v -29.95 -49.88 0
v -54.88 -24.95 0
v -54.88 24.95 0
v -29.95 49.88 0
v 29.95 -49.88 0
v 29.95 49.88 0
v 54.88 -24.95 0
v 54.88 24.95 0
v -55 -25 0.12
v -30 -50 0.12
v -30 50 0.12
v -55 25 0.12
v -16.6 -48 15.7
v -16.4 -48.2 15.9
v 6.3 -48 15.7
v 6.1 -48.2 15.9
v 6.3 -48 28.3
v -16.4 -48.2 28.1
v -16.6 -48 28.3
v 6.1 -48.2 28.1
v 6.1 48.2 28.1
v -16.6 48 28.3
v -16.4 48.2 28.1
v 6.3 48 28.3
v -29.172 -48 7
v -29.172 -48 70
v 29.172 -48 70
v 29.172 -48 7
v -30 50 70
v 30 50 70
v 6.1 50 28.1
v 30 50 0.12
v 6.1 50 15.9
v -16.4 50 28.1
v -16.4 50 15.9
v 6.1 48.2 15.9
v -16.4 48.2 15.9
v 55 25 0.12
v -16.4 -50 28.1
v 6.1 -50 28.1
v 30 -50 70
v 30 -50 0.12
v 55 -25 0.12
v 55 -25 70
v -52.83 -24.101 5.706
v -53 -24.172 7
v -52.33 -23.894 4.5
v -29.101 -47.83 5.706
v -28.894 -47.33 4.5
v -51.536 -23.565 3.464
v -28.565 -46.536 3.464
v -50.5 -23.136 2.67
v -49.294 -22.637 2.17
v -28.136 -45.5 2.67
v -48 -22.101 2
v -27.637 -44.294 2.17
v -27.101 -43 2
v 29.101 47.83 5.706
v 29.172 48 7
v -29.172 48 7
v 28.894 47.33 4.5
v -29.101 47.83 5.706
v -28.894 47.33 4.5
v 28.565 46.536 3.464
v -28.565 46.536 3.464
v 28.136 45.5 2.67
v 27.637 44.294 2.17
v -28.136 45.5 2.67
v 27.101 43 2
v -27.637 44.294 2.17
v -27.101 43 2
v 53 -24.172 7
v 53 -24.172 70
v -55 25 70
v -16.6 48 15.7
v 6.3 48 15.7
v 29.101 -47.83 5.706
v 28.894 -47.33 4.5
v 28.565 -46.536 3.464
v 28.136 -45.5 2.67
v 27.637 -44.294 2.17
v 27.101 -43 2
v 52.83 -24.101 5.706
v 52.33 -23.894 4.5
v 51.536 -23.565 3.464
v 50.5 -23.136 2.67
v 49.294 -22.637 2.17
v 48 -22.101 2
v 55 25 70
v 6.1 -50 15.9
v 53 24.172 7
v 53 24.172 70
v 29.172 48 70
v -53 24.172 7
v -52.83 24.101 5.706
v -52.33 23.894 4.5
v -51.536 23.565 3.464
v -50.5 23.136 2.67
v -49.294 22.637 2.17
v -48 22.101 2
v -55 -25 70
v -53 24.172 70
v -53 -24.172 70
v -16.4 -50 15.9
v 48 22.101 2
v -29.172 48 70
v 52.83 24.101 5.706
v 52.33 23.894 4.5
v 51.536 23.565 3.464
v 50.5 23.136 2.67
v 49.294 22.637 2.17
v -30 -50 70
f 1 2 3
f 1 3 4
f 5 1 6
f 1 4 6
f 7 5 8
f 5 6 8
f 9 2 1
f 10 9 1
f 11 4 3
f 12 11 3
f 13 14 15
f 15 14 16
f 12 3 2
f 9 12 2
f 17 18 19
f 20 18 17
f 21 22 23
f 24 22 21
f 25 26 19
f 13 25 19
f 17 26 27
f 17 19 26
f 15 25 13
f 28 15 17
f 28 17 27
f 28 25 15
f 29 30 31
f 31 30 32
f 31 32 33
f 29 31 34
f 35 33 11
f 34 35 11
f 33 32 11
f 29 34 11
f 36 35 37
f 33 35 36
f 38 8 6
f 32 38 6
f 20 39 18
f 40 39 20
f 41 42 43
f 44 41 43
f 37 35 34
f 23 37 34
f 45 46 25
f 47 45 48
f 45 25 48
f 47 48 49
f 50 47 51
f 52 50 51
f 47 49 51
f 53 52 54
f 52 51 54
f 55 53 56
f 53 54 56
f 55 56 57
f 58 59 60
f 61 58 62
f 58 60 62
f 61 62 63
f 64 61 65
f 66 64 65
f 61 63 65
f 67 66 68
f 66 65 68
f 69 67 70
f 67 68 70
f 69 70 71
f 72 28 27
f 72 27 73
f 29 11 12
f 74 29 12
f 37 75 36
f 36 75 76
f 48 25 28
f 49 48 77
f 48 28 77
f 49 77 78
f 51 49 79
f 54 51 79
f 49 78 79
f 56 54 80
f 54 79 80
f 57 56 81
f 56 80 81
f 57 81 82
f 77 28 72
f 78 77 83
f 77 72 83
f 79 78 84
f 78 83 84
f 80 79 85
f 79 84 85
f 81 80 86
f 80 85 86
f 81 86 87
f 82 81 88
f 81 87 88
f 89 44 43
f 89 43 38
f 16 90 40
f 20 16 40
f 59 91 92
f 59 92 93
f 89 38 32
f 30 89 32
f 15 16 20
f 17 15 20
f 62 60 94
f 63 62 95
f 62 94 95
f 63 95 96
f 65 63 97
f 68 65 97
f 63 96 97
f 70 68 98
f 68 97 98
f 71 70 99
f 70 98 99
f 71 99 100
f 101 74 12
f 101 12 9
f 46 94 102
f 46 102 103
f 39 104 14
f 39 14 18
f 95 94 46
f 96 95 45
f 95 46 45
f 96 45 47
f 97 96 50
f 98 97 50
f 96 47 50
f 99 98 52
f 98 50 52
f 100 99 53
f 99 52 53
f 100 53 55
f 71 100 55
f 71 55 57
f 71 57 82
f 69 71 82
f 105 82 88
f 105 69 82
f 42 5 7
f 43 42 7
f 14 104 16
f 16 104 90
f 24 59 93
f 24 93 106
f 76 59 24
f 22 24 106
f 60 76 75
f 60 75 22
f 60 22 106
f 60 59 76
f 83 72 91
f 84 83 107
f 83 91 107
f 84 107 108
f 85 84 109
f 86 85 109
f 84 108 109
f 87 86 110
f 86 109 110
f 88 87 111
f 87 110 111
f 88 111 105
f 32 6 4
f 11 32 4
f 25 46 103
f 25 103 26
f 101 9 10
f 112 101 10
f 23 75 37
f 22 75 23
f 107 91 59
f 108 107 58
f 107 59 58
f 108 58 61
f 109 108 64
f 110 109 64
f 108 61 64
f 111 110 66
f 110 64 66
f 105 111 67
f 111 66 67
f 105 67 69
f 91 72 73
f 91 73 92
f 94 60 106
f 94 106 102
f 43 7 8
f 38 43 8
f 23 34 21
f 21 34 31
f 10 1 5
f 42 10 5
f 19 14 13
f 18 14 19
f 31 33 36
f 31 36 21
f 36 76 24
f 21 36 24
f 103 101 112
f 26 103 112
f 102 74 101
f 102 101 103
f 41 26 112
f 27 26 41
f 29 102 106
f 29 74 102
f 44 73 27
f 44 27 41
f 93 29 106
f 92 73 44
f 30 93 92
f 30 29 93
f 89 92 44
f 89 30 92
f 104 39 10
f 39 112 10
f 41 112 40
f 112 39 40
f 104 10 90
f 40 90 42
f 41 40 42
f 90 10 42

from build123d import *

# Parameters (mm, degrees)
SALIENTE_EXTRUIR1_DEPTH = 70
VACIADO1_T              = -2
CORTAR_EXTRUIR1_REACH   = 135.884
CROQUIS4_W              = 22.5
CROQUIS4_H              = 12.2
REDONDEO1_R             = 5
CHAFL_N1_SIZE           = 0.12
CHAFL_N2_SIZE           = 0.2


with BuildPart() as part:
    # Croquis1 → Saliente-Extruir1 (new body)
    with BuildSketch(Plane.XY):
        Polygon((30, 50), (-30, 50), (-55, 25), (-55, -25), (-30, -50), (30, -50), (55, -25), (55, 25), align=None)
    extrude(amount=SALIENTE_EXTRUIR1_DEPTH)

    # Vaciado1
    vaciado1_openings = [part.faces().sort_by_distance(p)[0] for p in [
        (0, 0, 70),
    ]]
    offset(amount=VACIADO1_T, openings=vaciado1_openings, kind=Kind.INTERSECTION)

    # Croquis4 → Cortar-Extruir1 (cut, up to next)
    with BuildSketch(Plane.XZ.offset(50), mode=Mode.PRIVATE) as cortar_extruir1_sk1:
        with Locations((-5.15, 22)):
            Rectangle(CROQUIS4_W, CROQUIS4_H)
    cortar_extruir1_tool1 = extrude(cortar_extruir1_sk1.sketch, amount=-CORTAR_EXTRUIR1_REACH, mode=Mode.PRIVATE) & part.part
    cortar_extruir1 = cortar_extruir1_tool1.solids().sort_by_distance((-5.15, -50, 22))[0]
    add(cortar_extruir1, mode=Mode.SUBTRACT)

    # Simetría1: Cortar-Extruir1 across plane
    add(cortar_extruir1.mirror(Plane.ZX), mode=Mode.SUBTRACT)

    # Redondeo1
    redondeo1_edges = [part.edges().sort_by_distance(p)[0] for p in [
        (41.085786438, -36.085786438, 2),
        (53, 0, 2),
        (41.085786438, 36.085786438, 2),
        (0, 48, 2),
        (-41.085786438, 36.085786438, 2),
        (-53, 0, 2),
        (-41.085786438, -36.085786438, 2),
        (0, -48, 2),
    ]]
    fillet(redondeo1_edges, radius=REDONDEO1_R)

    # Chaflán1
    chafl_n1_edges = [part.edges().sort_by_distance(p)[0] for p in [
        (0, 50, 0),
        (42.5, 37.5, 0),
        (55, 0, 0),
        (42.5, -37.5, 0),
        (0, -50, 0),
        (-42.5, -37.5, 0),
        (-55, 0, 0),
        (-42.5, 37.5, 0),
    ]]
    chamfer(chafl_n1_edges, length=CHAFL_N1_SIZE)

    # Chaflán2
    chafl_n2_edges = [part.edges().sort_by_distance(p)[0] for p in [
        (-5.15, -48, 15.9),
        (6.1, -48, 22),
        (-5.15, -48, 28.1),
        (-16.4, -48, 22),
        (-5.15, 48, 28.1),
        (-16.4, 48, 22),
        (-5.15, 48, 15.9),
        (6.1, 48, 22),
    ]]
    chamfer(chafl_n2_edges, length=CHAFL_N2_SIZE)


solid = part.part
